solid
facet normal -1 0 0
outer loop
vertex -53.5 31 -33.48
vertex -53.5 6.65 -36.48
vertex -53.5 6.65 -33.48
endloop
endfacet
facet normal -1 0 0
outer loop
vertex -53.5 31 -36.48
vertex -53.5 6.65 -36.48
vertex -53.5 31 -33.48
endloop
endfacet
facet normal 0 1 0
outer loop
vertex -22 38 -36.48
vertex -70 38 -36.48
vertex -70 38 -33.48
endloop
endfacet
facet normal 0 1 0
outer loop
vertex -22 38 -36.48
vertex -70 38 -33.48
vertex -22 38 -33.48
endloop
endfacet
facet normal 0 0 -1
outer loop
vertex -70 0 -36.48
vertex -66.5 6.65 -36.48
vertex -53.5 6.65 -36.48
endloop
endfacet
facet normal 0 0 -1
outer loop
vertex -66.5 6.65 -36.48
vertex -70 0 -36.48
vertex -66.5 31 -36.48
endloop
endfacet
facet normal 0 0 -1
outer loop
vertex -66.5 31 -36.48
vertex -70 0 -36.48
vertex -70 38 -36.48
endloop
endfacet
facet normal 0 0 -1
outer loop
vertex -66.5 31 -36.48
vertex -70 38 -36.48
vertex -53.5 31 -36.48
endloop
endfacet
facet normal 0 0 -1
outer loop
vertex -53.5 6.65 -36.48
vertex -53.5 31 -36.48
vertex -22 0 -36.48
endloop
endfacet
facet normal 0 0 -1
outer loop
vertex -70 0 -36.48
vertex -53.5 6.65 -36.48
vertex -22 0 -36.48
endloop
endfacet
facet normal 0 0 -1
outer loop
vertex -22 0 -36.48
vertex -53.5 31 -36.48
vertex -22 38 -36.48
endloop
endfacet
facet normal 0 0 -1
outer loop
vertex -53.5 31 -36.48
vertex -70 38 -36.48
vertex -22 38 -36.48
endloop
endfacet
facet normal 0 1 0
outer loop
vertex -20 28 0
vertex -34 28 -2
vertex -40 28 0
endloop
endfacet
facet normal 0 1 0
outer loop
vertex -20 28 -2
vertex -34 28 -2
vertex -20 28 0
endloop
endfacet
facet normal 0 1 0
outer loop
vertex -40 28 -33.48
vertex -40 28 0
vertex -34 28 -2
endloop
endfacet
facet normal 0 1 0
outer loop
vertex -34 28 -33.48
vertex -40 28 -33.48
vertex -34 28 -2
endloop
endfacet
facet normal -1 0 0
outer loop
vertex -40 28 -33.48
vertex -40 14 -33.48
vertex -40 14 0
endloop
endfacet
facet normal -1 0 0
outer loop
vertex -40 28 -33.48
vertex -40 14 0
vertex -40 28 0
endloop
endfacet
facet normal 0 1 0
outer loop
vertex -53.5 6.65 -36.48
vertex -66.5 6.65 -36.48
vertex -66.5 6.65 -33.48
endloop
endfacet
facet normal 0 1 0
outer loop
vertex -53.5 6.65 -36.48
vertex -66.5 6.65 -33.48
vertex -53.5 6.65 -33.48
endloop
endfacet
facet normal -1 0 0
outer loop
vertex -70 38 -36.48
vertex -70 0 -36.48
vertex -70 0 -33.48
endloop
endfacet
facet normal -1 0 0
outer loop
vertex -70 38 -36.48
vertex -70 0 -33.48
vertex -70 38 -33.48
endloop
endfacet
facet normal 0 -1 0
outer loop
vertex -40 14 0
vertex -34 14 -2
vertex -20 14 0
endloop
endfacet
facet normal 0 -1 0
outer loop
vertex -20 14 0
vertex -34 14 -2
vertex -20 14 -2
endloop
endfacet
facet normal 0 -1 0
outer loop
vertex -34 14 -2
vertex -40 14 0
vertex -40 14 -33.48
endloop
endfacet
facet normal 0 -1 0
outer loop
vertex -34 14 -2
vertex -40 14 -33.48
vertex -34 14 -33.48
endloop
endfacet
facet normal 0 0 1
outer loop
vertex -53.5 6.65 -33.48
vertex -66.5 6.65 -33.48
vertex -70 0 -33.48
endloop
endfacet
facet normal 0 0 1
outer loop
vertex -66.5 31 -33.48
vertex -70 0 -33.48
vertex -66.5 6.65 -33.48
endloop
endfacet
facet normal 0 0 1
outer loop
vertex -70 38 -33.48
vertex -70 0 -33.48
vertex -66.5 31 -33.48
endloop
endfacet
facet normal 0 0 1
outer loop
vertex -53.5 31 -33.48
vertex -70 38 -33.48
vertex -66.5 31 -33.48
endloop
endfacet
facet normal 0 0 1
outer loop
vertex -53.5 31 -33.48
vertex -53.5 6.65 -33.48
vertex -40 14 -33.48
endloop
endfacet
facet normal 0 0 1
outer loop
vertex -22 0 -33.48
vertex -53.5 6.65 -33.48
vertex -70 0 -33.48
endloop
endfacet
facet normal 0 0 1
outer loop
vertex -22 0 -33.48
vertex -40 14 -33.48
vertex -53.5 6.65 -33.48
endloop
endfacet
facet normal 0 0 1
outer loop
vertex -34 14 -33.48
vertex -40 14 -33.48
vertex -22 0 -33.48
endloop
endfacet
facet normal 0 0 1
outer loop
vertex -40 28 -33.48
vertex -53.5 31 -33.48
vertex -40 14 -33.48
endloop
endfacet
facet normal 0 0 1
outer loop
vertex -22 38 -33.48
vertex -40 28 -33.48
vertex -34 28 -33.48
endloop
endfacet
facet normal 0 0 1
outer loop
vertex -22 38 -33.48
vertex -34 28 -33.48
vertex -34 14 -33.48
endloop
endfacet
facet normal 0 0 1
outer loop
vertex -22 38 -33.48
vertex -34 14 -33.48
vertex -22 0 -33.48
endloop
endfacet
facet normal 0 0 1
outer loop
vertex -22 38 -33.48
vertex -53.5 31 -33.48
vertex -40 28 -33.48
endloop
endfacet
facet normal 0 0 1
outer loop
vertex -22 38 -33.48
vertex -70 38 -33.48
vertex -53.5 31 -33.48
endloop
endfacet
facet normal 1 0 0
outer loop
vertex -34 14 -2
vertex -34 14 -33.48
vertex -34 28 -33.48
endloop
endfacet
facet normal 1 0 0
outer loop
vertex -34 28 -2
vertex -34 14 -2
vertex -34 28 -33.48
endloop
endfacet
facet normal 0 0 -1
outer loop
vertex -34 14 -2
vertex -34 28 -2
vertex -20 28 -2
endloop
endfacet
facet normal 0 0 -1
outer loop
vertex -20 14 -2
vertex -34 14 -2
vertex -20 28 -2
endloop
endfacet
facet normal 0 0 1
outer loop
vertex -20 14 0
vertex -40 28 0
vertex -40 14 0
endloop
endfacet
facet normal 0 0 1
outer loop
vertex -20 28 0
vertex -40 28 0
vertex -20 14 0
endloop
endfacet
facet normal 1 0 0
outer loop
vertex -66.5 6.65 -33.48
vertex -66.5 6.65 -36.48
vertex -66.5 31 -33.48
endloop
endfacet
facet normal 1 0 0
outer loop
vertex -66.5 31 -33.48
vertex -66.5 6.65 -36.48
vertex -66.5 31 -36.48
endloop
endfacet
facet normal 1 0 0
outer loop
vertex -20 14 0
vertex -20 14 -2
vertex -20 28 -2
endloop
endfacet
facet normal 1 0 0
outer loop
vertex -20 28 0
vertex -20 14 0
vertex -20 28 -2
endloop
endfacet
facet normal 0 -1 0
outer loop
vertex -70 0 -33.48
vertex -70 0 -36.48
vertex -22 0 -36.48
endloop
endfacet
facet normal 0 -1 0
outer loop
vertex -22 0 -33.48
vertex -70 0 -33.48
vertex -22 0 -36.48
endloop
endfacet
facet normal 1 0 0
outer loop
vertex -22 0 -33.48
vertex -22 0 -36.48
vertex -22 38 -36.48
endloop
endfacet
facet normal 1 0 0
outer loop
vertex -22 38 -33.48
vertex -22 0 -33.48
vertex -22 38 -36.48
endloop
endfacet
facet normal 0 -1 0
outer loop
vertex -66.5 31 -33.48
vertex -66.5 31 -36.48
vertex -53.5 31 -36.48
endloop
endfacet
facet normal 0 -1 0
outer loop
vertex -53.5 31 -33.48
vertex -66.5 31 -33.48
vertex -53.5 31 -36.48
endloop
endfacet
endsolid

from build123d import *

# Parameters (mm, degrees)
SERVO_SHELF_START           = -36.480025
SKETCH1_W                   = 48
SKETCH1_H                   = 38
SKETCH1_W_2                 = 13
SKETCH1_H_2                 = 24.35
SERVO_SHELF_DEPTH           = 3
OUTBOARD_RISER_START        = -34.480025
SKETCH2_W                   = 6
SKETCH2_H                   = 14
OUTBOARD_RISER_DEPTH        = 33.480025
PLATE_ATTACHMENT_FOOT_START = -2
SKETCH3_W                   = 20
SKETCH3_H                   = 14
PLATE_ATTACHMENT_FOOT_DEPTH = 2


with BuildPart() as part:
    # Sketch1 → Servo_Shelf (new body)
    with BuildSketch(Plane.XY.offset(SERVO_SHELF_START)):
        with Locations((-46, 19)):
            Rectangle(SKETCH1_W, SKETCH1_H)
        with Locations((-60, 18.825)):
            Rectangle(SKETCH1_W_2, SKETCH1_H_2, mode=Mode.SUBTRACT)
    extrude(amount=SERVO_SHELF_DEPTH)

    # Sketch2 → Outboard_Riser (add)
    with BuildSketch(Plane.XY.offset(OUTBOARD_RISER_START)):
        with Locations((-37, 21)):
            Rectangle(SKETCH2_W, SKETCH2_H)
    extrude(amount=OUTBOARD_RISER_DEPTH)

    # Sketch3 → Plate_Attachment_Foot (add)
    with BuildSketch(Plane.XY.offset(PLATE_ATTACHMENT_FOOT_START)):
        with Locations((-30, 21)):
            Rectangle(SKETCH3_W, SKETCH3_H)
    extrude(amount=PLATE_ATTACHMENT_FOOT_DEPTH)


solid = part.part
